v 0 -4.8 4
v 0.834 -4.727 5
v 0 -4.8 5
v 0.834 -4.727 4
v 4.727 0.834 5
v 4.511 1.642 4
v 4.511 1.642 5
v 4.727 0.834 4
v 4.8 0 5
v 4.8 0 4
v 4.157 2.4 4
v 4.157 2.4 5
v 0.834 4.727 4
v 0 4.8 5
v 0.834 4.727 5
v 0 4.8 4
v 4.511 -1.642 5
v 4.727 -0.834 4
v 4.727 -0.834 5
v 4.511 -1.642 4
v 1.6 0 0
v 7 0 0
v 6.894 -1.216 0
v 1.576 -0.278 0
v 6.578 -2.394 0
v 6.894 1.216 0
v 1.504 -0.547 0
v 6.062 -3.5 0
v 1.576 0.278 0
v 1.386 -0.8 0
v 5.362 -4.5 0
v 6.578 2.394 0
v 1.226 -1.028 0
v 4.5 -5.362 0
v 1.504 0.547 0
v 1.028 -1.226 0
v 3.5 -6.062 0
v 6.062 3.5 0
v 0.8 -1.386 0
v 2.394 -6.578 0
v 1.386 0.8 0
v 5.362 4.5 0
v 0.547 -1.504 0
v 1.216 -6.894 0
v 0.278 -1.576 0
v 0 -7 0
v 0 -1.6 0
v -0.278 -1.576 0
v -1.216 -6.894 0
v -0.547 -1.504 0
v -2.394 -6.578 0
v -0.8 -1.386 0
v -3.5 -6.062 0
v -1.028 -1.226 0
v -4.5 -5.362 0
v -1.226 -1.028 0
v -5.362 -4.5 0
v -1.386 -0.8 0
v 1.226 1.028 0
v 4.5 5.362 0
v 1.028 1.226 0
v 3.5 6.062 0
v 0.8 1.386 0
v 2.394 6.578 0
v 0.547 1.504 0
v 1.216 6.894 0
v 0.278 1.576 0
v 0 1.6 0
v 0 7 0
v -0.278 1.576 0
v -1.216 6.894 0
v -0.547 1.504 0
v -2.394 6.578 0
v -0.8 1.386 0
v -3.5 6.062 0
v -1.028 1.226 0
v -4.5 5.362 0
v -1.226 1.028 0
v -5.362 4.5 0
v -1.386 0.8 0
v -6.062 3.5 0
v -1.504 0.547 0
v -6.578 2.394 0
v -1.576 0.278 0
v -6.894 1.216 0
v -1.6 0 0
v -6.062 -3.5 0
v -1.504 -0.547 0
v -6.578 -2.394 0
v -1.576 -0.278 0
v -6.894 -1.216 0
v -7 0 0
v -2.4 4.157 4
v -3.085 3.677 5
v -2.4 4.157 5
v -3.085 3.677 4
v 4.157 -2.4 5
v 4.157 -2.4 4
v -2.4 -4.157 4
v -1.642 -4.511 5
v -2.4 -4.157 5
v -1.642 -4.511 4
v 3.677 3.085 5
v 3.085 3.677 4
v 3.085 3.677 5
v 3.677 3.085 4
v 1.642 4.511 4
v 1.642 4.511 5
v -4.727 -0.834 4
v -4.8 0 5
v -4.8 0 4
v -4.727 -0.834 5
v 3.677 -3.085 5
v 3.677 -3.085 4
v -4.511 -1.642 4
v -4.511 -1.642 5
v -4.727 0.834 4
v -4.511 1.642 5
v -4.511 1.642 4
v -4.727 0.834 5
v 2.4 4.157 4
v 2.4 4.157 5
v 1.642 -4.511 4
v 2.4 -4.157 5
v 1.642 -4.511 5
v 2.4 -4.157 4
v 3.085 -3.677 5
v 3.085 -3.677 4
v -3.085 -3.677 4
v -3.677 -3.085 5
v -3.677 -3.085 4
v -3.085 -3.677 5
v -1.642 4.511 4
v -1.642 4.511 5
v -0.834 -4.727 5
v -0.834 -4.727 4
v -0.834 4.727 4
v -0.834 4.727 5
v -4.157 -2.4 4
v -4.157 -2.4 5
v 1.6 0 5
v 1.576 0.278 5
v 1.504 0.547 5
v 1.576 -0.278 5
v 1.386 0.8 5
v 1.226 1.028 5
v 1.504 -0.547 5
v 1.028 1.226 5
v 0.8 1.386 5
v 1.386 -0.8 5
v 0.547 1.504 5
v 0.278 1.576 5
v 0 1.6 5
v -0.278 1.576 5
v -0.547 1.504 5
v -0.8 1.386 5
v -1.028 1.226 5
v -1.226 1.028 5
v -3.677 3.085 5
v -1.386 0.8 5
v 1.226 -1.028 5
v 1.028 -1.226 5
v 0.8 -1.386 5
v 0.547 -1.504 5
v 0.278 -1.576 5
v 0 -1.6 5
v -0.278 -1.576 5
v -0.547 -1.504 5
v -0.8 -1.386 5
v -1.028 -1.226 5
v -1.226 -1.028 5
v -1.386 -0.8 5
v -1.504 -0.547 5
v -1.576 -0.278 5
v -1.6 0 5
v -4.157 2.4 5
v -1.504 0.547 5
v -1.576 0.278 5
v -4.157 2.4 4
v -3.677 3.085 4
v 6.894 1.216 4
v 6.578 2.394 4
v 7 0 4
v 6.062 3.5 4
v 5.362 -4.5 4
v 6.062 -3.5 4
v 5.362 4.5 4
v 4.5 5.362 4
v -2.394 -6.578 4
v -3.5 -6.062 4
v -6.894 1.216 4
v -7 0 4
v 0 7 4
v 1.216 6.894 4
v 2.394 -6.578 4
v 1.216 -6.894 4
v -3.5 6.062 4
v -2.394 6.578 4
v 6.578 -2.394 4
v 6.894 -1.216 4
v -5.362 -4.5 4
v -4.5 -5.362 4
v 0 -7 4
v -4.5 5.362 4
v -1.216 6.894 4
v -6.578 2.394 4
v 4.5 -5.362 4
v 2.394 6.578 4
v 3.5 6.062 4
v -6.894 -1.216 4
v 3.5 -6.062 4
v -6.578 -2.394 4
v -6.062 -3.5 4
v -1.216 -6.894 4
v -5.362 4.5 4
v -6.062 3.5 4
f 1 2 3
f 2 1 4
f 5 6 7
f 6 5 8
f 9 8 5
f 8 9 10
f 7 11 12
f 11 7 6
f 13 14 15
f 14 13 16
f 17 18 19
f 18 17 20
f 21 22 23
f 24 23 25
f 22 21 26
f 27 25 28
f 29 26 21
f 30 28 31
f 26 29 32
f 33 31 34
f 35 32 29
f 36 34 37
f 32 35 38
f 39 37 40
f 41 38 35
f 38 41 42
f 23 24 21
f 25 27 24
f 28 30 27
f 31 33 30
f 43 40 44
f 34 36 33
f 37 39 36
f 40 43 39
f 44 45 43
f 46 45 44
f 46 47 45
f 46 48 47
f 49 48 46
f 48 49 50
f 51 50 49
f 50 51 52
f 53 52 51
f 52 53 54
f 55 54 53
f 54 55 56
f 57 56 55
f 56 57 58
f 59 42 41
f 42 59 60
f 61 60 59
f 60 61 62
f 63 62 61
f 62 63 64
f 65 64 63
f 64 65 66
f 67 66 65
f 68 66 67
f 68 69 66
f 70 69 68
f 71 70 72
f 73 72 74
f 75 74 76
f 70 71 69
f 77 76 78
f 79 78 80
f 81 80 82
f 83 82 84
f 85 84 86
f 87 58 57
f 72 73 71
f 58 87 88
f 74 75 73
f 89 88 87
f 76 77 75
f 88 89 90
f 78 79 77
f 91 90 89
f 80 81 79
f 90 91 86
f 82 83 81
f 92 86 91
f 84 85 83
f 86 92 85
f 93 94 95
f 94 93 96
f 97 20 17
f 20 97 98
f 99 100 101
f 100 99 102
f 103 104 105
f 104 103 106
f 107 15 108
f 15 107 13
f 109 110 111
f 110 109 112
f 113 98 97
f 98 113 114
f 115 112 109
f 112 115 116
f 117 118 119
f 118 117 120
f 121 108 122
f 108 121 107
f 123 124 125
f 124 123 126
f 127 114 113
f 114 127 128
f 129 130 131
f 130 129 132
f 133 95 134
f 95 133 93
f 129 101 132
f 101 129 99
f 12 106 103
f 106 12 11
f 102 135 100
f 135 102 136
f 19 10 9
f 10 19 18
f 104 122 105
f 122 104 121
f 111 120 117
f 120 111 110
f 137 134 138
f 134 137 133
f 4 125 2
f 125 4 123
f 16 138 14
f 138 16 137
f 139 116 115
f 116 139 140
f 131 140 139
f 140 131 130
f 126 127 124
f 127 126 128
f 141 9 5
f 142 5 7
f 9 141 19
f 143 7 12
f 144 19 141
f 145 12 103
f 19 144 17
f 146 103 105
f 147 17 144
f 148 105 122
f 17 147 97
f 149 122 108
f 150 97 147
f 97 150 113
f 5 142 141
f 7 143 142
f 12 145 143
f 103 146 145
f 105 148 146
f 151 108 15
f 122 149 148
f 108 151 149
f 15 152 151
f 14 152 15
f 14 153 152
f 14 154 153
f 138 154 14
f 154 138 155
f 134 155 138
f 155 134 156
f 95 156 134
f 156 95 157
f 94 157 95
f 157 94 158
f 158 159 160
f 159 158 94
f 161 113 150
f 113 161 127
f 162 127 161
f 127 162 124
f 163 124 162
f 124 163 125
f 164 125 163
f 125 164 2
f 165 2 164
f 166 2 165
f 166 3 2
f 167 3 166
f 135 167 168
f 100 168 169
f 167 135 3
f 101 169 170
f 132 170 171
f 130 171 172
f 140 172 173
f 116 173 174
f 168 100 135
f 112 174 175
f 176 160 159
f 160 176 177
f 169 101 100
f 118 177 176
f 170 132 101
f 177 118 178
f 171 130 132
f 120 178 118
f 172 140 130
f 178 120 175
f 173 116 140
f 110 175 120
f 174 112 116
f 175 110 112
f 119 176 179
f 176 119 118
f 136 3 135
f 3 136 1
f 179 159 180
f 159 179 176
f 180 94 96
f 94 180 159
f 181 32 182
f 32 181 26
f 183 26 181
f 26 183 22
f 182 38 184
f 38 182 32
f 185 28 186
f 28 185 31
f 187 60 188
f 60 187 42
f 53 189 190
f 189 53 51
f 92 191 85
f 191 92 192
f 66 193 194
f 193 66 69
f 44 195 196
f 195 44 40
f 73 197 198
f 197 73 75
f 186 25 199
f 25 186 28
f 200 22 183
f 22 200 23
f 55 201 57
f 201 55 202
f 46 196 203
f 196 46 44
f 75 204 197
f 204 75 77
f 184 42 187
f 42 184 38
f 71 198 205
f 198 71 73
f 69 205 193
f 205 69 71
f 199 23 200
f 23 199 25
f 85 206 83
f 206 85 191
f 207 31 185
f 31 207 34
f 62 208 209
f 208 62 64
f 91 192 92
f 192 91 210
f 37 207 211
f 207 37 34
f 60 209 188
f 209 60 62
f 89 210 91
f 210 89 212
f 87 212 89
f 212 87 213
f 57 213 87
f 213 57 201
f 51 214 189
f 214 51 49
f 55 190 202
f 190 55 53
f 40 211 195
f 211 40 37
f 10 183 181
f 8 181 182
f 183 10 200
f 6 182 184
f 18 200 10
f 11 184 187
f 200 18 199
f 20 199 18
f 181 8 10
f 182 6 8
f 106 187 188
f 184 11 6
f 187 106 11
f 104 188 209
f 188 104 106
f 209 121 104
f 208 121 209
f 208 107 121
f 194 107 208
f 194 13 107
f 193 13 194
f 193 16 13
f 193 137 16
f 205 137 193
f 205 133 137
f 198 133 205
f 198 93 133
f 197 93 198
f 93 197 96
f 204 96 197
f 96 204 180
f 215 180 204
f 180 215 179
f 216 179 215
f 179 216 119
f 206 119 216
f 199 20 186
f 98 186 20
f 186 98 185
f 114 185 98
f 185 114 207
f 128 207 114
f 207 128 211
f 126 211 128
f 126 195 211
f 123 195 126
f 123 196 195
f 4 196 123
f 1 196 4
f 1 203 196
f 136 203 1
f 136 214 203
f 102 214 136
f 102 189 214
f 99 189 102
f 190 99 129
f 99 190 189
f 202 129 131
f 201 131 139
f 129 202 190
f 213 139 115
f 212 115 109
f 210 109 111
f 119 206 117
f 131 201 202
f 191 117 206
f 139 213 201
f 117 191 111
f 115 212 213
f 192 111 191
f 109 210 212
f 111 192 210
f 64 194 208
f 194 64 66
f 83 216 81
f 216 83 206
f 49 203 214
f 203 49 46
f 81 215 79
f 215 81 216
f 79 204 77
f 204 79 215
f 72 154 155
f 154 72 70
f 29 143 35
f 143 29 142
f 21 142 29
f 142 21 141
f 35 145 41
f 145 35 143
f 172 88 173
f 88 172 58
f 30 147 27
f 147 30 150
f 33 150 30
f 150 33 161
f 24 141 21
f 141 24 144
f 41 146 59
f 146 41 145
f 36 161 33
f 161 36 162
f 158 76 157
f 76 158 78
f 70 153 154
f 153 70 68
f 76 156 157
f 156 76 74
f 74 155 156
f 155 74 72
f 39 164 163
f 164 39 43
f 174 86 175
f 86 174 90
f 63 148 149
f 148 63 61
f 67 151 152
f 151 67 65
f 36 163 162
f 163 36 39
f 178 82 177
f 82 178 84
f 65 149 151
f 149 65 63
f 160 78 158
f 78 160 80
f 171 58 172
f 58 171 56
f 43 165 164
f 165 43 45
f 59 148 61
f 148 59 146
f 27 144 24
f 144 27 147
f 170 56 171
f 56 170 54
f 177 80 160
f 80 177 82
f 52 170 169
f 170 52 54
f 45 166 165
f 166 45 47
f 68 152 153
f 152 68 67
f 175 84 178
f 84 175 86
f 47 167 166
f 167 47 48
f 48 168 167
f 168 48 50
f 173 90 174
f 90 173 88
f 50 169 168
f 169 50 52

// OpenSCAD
postDia = 9.6;
postHeight = 5;
shoulderDia = 14;
shoulderHeight = 4;
holeDia = 3.2;

difference() {
union() {
	cylinder($fn=36,r=postDia/2,h=postHeight);
	cylinder($fn=36,r=shoulderDia/2,h=shoulderHeight);	
}

cylinder($fn=36,r=holeDia/2,h=15);
}
